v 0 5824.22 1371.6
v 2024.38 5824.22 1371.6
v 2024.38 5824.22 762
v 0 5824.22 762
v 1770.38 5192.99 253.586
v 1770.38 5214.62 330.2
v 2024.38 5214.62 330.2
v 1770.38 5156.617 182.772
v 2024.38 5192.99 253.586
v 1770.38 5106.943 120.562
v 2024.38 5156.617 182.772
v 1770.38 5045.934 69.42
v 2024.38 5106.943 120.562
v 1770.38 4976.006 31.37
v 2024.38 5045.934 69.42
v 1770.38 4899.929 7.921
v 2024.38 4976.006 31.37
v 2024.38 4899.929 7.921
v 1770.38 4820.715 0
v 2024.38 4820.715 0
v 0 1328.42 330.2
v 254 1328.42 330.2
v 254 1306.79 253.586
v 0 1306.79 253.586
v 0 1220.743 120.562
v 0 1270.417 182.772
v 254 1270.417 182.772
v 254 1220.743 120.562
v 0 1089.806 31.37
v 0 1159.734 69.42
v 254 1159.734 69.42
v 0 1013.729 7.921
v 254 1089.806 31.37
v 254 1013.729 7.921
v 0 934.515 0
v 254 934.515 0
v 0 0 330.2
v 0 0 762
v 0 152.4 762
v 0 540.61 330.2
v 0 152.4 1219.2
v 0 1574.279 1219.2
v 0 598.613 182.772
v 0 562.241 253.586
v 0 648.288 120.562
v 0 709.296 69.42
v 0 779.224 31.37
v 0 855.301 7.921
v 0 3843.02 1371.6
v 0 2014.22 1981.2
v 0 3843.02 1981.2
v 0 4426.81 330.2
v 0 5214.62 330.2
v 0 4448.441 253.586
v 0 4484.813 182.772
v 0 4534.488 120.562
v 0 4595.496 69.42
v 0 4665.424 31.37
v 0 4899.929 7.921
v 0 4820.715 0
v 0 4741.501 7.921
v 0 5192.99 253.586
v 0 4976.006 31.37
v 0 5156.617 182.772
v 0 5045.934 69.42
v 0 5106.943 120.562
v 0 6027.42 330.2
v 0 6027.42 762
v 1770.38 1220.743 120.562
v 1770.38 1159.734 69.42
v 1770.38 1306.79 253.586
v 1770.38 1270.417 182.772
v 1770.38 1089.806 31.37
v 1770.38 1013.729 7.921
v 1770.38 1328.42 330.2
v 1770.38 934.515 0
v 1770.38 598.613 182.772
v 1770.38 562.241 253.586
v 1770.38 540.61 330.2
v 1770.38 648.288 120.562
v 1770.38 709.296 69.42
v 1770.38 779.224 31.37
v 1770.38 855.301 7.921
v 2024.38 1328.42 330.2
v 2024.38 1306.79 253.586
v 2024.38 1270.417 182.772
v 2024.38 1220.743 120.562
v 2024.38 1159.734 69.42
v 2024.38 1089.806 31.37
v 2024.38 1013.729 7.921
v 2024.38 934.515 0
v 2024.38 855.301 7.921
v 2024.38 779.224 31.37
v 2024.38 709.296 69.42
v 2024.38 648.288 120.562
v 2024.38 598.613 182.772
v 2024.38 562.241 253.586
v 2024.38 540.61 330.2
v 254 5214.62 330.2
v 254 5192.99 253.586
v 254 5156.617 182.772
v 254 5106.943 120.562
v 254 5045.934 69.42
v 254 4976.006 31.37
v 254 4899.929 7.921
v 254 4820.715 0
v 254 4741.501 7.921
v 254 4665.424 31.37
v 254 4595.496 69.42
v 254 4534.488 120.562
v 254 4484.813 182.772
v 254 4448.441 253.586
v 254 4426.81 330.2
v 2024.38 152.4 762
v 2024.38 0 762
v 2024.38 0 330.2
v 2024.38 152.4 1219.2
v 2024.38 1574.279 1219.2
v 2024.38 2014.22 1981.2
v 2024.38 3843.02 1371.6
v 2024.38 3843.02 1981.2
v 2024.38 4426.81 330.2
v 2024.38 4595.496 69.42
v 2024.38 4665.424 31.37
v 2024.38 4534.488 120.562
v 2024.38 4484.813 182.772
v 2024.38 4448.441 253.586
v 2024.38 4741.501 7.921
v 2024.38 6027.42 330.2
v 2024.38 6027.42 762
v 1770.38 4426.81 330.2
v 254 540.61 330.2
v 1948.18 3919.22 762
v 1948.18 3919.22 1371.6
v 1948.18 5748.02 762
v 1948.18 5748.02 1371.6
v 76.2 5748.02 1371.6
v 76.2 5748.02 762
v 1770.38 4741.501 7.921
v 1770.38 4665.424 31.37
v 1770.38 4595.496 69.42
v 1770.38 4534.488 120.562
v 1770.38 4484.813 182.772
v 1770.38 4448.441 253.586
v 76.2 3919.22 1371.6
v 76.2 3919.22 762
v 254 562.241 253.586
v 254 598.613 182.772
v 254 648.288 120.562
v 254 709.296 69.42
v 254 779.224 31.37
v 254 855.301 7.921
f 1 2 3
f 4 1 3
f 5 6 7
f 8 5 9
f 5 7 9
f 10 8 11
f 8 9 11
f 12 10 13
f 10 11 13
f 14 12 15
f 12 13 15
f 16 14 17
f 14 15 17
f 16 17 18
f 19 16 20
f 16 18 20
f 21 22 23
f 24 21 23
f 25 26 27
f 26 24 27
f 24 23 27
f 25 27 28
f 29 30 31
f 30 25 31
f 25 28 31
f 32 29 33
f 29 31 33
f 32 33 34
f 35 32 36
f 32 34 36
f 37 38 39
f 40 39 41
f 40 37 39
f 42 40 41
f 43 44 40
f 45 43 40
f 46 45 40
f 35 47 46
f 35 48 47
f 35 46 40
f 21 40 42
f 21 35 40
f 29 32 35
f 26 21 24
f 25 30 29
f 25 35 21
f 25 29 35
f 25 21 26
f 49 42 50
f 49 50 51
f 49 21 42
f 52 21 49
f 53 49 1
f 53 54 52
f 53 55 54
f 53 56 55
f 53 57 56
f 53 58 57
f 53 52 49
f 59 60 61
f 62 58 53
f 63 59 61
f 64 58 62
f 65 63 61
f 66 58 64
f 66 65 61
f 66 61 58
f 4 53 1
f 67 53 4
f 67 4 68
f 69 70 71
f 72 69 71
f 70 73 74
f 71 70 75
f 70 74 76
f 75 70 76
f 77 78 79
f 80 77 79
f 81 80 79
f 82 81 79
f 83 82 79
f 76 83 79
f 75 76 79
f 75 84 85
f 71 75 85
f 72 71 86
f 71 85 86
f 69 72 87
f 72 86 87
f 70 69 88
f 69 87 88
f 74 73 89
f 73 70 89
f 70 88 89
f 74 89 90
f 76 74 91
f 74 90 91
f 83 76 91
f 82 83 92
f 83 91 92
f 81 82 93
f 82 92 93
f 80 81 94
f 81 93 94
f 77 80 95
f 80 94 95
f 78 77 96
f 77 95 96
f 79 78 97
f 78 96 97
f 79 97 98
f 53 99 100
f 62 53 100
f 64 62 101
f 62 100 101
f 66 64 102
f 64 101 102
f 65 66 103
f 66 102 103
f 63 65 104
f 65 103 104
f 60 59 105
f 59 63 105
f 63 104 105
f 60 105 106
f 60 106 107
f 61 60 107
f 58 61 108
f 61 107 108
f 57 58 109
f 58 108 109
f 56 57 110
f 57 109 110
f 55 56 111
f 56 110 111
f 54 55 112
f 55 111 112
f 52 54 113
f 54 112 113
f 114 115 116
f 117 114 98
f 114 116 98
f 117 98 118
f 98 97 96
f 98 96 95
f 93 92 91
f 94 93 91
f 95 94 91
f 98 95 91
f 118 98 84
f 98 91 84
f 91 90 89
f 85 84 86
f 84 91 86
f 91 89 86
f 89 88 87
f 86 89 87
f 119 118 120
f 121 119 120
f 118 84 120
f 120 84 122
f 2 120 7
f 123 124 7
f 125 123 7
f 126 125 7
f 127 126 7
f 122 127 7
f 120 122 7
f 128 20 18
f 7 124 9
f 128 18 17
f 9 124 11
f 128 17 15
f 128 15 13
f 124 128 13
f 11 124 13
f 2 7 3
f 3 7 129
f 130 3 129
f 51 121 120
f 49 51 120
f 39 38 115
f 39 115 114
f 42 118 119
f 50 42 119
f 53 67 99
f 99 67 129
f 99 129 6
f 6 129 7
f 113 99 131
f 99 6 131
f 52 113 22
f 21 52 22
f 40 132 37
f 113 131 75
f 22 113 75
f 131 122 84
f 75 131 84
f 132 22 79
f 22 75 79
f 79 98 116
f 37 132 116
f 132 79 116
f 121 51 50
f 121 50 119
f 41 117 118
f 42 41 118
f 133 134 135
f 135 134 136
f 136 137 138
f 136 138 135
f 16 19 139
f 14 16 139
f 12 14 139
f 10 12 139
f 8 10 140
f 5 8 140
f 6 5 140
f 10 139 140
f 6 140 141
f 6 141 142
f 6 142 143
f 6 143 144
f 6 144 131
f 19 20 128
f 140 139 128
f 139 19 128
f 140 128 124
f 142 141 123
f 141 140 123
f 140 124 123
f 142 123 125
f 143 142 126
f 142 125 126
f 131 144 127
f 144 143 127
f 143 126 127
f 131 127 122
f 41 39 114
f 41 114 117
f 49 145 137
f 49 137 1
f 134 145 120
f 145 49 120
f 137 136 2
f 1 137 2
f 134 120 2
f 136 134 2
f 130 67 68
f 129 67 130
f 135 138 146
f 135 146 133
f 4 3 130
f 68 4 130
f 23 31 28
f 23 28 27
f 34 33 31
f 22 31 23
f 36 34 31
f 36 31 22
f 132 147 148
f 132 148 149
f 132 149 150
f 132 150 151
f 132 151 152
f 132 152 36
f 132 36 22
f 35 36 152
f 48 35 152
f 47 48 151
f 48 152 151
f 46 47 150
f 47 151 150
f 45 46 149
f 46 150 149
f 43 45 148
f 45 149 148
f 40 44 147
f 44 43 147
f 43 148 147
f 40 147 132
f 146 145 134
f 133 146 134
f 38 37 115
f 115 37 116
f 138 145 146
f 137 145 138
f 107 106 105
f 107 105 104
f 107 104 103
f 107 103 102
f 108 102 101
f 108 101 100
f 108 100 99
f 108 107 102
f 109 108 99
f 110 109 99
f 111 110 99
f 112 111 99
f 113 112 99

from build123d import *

# Parameters (mm, degrees)
F0_W     = 2024.38
F0_H     = 6027.42
F1_DEPTH = 1981.2
F3_DEPTH = 2024.381
F4_W     = 1516.38
F4_H     = 330.2
F5_DEPTH = 6027.421
F7_DEPTH = 2024.381
F8_W     = 1871.98
F8_H     = 1828.8
F9_DEPTH = 609.6


with BuildPart() as f1:
    # F0 (on Top) → F1 (new body)
    with BuildSketch(Plane.XY):
        with Locations((1012.19, 3013.71)):
            Rectangle(F0_W, F0_H)
    extrude(amount=F1_DEPTH)

    # F2 (on face) → F3 (cut, through all)
    with BuildSketch(Plane.YZ.offset(2024.38)):
        Polygon((5824.22, 762), (6027.42, 762), (6027.42, 1981.2), (3843.02, 1981.2), (3843.02, 1371.6), (5824.22, 1371.6), align=None)
        Polygon((1574.279095, 1219.2), (2014.22, 1981.2), (0, 1981.2), (0, 762), (152.4, 762), (152.4, 1219.2), align=None)
    extrude(amount=-F3_DEPTH, mode=Mode.SUBTRACT)

    # F4 (on face) → F5 (cut, through all)
    with BuildSketch(Plane.XZ):
        with Locations((1012.19, 165.1)):
            Rectangle(F4_W, F4_H)
    extrude(amount=-F5_DEPTH, mode=Mode.SUBTRACT)

    # F6 (on face) → F7 (cut, through all)
    with BuildSketch(Plane.YZ.offset(2024.38)):
        with BuildLine():
            ThreePointArc((5214.62, 330.2), (5077.713765, 93.469264), (4820.715214, 0))
            Line((4820.715214, 0), (6027.42, 0))
            Line((6027.42, 0), (6027.42, 330.2))
            Line((6027.42, 330.2), (5214.62, 330.2))
        make_face()
        with BuildLine():
            ThreePointArc((1328.42, 330.2), (1191.513765, 93.469264), (934.515214, 0))
            Line((934.515214, 0), (4820.715214, 0))
            ThreePointArc((4820.715214, 0), (4563.716664, 93.469265), (4426.810429, 330.2))
            Line((4426.810429, 330.2), (1328.42, 330.2))
        make_face()
        with BuildLine():
            Line((540.610429, 330.2), (0, 330.2))
            Line((0, 330.2), (0, 0))
            Line((0, 0), (934.515214, 0))
            ThreePointArc((934.515214, 0), (677.516664, 93.469264), (540.610429, 330.2))
        make_face()
    extrude(amount=-F7_DEPTH, mode=Mode.SUBTRACT)

    # F8 (on face) → F9 (cut, through all)
    with BuildSketch(Plane.XY.offset(1371.6)):
        with Locations((1012.19, 4833.62)):
            Rectangle(F8_W, F8_H)
    extrude(amount=-F9_DEPTH, mode=Mode.SUBTRACT)


solid = f1.part
